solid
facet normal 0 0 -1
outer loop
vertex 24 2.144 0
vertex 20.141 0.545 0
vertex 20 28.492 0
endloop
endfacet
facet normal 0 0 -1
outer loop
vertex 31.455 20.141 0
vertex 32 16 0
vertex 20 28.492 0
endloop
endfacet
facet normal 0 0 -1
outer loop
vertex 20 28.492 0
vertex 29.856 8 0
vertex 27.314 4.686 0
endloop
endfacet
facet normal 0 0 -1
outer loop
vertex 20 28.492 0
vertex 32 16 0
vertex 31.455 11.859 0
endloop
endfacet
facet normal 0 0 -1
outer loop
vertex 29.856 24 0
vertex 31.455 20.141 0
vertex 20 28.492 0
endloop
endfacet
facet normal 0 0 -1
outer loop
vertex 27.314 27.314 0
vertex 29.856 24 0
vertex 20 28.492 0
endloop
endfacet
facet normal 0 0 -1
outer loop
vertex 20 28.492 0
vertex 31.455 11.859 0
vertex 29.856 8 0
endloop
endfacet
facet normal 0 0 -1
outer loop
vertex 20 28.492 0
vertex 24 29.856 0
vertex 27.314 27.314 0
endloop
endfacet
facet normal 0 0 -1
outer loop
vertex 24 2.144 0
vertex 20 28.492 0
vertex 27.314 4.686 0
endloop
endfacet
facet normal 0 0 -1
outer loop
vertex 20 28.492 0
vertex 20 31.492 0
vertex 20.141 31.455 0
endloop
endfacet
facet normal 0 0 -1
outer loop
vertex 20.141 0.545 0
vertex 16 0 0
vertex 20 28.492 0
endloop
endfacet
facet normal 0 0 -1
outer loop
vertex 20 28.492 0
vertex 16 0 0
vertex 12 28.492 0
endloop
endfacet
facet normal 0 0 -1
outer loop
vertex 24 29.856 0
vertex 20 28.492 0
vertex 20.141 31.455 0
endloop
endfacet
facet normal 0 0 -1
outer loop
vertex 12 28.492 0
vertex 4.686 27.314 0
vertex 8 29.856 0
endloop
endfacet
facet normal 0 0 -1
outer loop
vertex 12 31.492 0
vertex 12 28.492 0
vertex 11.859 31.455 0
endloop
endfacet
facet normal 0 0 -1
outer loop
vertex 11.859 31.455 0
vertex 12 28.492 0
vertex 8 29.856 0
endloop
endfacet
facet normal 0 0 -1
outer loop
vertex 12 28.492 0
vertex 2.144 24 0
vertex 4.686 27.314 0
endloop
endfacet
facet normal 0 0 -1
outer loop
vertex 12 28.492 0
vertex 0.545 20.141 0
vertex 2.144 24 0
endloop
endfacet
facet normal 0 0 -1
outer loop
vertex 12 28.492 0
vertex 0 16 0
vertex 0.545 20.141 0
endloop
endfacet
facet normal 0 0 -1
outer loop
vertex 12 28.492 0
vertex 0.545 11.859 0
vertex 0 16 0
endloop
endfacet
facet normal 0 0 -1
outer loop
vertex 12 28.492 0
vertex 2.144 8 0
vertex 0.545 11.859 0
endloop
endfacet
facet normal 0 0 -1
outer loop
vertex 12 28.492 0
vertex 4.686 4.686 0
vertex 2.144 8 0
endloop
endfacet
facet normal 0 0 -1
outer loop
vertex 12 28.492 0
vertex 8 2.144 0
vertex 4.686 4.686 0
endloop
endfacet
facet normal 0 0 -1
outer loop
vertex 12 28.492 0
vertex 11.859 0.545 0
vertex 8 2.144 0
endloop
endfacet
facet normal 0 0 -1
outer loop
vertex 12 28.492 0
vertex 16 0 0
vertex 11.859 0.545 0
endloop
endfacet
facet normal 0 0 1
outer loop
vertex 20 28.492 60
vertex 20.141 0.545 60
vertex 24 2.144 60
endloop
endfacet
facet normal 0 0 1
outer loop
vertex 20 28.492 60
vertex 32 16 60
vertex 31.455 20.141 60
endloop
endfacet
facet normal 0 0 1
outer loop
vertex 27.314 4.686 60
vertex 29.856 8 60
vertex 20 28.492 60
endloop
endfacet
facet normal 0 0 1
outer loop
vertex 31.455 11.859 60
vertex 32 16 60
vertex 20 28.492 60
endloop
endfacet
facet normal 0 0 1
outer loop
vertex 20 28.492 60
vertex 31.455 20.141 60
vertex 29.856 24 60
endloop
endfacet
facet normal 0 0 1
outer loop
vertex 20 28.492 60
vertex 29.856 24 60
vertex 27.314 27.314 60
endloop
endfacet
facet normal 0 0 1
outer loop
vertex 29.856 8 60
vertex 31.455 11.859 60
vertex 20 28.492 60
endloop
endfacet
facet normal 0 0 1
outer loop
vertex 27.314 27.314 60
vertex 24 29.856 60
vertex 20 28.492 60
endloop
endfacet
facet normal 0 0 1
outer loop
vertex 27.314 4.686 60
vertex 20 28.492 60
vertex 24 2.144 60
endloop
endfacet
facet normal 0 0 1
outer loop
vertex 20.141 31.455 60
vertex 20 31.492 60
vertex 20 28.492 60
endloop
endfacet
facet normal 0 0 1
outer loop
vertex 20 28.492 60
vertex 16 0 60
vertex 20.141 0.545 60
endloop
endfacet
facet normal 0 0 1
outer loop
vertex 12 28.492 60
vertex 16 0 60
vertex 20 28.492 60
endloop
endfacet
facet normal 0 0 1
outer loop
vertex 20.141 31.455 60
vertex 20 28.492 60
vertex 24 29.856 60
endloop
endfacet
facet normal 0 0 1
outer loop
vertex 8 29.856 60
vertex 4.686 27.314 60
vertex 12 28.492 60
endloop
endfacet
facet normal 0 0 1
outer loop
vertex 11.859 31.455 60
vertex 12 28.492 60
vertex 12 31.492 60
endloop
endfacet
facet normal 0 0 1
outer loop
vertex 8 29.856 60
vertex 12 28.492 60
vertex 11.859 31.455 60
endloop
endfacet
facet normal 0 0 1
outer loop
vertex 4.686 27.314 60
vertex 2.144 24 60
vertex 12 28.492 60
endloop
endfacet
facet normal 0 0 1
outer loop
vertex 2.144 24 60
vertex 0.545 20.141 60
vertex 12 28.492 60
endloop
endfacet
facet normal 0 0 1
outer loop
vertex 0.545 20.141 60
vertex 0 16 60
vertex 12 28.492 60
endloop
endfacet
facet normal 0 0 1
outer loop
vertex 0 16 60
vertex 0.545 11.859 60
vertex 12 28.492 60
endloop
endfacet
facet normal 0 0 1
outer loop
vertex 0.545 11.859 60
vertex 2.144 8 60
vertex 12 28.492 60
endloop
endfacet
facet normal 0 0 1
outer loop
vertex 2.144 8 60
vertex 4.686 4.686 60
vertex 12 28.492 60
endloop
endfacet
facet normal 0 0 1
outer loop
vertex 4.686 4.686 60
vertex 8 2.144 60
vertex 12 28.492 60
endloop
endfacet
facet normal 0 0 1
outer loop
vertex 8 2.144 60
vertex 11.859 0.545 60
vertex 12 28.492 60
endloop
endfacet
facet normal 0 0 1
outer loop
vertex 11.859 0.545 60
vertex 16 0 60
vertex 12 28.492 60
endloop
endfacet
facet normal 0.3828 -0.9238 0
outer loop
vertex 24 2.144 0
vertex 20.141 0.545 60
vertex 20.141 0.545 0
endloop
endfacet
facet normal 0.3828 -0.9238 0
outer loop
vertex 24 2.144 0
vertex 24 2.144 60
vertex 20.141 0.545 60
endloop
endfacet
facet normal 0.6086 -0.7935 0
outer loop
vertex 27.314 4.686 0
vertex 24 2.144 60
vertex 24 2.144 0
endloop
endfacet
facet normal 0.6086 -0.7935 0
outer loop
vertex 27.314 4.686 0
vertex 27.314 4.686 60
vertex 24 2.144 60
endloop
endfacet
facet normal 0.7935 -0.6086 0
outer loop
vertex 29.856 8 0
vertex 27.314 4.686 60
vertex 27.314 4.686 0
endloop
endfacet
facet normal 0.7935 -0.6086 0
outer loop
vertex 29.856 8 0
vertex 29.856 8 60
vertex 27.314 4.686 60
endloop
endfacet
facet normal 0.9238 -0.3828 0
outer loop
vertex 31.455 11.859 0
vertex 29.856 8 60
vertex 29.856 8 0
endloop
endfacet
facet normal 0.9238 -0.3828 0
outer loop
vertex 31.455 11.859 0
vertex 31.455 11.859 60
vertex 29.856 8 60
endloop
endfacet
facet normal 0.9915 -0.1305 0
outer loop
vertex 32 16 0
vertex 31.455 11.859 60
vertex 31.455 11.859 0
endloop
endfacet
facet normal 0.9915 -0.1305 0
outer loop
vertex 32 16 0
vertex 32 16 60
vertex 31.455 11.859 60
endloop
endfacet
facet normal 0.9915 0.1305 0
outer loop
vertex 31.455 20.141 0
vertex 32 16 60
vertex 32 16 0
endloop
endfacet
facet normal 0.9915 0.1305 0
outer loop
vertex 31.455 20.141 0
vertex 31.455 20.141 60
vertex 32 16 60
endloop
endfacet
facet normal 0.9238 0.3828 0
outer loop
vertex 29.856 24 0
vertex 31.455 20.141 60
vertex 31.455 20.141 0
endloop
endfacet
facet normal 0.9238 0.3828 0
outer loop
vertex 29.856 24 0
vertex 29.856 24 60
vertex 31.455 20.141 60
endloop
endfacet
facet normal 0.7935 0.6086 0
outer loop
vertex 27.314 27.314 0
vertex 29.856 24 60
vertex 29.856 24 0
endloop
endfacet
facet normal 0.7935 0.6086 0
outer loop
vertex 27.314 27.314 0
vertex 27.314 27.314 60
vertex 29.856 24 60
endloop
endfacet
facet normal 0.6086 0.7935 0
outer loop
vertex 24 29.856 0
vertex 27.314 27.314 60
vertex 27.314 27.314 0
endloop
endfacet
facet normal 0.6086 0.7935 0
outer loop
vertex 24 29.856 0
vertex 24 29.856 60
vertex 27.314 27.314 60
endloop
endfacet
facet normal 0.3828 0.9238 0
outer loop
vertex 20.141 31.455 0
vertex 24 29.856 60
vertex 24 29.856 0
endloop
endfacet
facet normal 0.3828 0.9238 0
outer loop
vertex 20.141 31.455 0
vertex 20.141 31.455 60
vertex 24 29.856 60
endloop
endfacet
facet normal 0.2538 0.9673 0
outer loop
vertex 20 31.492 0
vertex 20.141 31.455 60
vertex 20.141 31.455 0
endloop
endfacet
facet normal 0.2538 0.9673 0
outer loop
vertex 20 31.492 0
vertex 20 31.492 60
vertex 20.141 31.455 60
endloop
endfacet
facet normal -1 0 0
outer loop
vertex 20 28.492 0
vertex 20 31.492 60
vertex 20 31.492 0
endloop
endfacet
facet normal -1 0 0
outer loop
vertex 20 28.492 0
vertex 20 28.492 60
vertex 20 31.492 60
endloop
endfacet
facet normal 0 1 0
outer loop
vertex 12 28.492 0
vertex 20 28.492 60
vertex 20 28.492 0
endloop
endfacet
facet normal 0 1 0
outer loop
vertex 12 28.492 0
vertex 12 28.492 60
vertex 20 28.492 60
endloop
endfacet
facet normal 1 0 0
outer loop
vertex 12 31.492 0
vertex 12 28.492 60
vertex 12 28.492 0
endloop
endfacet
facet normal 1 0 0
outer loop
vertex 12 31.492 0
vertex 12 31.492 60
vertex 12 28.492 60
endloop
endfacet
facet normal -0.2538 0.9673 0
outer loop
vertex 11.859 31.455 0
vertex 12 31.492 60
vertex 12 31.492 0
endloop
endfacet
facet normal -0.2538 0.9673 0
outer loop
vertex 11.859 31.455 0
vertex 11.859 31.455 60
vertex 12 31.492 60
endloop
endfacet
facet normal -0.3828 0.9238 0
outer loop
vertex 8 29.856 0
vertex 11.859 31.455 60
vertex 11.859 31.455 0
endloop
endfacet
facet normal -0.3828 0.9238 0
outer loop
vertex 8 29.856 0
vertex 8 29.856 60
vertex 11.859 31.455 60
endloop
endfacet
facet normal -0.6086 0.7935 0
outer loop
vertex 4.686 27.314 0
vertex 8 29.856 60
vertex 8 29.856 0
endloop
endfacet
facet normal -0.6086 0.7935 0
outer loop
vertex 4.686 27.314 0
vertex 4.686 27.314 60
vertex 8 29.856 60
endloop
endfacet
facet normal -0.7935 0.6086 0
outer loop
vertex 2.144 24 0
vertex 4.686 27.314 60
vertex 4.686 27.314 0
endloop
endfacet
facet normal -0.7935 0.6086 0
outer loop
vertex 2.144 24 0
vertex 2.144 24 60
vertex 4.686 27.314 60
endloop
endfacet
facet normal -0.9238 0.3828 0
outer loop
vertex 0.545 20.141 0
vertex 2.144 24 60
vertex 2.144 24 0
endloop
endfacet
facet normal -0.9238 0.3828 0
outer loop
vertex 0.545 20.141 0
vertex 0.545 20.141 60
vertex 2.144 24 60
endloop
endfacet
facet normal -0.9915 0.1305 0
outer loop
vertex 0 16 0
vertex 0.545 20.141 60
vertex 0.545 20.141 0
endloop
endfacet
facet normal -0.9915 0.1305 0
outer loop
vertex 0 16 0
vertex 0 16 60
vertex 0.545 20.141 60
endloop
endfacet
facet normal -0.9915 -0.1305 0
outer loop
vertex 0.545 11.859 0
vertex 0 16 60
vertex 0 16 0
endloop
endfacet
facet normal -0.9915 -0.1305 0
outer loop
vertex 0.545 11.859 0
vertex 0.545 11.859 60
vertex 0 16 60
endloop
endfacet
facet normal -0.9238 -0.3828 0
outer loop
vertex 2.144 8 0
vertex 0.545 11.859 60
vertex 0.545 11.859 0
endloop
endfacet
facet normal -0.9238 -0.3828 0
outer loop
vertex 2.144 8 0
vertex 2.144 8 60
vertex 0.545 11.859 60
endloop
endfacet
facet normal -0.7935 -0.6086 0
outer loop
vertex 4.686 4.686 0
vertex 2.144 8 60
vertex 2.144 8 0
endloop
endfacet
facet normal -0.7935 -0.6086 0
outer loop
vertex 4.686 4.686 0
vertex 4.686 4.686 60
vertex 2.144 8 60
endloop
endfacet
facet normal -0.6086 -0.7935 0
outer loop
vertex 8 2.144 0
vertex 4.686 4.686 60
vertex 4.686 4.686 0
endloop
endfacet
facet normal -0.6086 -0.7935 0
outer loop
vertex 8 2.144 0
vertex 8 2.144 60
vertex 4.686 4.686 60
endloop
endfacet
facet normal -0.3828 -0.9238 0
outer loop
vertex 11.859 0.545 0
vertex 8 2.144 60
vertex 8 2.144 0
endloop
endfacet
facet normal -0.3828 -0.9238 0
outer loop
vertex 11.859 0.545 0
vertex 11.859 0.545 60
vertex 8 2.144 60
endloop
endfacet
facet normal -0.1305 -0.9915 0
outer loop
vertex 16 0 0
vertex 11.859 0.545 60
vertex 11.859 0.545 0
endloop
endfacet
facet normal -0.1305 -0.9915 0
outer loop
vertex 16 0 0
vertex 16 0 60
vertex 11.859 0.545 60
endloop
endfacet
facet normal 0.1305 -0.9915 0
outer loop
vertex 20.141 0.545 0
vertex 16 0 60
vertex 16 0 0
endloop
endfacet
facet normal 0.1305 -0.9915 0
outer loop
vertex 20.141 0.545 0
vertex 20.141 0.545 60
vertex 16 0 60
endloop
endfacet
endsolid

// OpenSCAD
$fn = 32;

// ----------------------------------------------------------------------
// Keyway shaft: d32 shaft, key 8 x 3 mm
// ----------------------------------------------------------------------

// --- parameters (mm) ---
shaft_r = 16;             // shaft radius
key_w = 8;                // keyway width
key_d = 3;                // keyway depth below the surface line
plate_t = 60;             // shaft length, Z (extrusion height)
fit_tol = 0.02;           // declared fit tolerance (prompt contract)
free_tol = 0.2;           // declared free tolerance (prompt contract)

shaft_d = 2 * shaft_r;  // shaft diameter
circle_step = 15;  // polygon sampling step, degrees

profile = [[11.859, 31.455], [8, 29.856], [4.686, 27.314], [2.144, 24], [0.545, 20.141], [0, 16], [0.545, 11.859], [2.144, 8], [4.686, 4.686], [8, 2.144], [11.859, 0.545], [16, 0], [20.141, 0.545], [24, 2.144], [27.314, 4.686], [29.856, 8], [31.455, 11.859], [32, 16], [31.455, 20.141], [29.856, 24], [27.314, 27.314], [24, 29.856], [20.141, 31.455], [20, 31.492], [20, 28.492], [12, 28.492], [12, 31.492]];  // primary outline, 27 points, counter clockwise

// --- the one profile operation ---
linear_extrude(height = plate_t) polygon(points = profile);
